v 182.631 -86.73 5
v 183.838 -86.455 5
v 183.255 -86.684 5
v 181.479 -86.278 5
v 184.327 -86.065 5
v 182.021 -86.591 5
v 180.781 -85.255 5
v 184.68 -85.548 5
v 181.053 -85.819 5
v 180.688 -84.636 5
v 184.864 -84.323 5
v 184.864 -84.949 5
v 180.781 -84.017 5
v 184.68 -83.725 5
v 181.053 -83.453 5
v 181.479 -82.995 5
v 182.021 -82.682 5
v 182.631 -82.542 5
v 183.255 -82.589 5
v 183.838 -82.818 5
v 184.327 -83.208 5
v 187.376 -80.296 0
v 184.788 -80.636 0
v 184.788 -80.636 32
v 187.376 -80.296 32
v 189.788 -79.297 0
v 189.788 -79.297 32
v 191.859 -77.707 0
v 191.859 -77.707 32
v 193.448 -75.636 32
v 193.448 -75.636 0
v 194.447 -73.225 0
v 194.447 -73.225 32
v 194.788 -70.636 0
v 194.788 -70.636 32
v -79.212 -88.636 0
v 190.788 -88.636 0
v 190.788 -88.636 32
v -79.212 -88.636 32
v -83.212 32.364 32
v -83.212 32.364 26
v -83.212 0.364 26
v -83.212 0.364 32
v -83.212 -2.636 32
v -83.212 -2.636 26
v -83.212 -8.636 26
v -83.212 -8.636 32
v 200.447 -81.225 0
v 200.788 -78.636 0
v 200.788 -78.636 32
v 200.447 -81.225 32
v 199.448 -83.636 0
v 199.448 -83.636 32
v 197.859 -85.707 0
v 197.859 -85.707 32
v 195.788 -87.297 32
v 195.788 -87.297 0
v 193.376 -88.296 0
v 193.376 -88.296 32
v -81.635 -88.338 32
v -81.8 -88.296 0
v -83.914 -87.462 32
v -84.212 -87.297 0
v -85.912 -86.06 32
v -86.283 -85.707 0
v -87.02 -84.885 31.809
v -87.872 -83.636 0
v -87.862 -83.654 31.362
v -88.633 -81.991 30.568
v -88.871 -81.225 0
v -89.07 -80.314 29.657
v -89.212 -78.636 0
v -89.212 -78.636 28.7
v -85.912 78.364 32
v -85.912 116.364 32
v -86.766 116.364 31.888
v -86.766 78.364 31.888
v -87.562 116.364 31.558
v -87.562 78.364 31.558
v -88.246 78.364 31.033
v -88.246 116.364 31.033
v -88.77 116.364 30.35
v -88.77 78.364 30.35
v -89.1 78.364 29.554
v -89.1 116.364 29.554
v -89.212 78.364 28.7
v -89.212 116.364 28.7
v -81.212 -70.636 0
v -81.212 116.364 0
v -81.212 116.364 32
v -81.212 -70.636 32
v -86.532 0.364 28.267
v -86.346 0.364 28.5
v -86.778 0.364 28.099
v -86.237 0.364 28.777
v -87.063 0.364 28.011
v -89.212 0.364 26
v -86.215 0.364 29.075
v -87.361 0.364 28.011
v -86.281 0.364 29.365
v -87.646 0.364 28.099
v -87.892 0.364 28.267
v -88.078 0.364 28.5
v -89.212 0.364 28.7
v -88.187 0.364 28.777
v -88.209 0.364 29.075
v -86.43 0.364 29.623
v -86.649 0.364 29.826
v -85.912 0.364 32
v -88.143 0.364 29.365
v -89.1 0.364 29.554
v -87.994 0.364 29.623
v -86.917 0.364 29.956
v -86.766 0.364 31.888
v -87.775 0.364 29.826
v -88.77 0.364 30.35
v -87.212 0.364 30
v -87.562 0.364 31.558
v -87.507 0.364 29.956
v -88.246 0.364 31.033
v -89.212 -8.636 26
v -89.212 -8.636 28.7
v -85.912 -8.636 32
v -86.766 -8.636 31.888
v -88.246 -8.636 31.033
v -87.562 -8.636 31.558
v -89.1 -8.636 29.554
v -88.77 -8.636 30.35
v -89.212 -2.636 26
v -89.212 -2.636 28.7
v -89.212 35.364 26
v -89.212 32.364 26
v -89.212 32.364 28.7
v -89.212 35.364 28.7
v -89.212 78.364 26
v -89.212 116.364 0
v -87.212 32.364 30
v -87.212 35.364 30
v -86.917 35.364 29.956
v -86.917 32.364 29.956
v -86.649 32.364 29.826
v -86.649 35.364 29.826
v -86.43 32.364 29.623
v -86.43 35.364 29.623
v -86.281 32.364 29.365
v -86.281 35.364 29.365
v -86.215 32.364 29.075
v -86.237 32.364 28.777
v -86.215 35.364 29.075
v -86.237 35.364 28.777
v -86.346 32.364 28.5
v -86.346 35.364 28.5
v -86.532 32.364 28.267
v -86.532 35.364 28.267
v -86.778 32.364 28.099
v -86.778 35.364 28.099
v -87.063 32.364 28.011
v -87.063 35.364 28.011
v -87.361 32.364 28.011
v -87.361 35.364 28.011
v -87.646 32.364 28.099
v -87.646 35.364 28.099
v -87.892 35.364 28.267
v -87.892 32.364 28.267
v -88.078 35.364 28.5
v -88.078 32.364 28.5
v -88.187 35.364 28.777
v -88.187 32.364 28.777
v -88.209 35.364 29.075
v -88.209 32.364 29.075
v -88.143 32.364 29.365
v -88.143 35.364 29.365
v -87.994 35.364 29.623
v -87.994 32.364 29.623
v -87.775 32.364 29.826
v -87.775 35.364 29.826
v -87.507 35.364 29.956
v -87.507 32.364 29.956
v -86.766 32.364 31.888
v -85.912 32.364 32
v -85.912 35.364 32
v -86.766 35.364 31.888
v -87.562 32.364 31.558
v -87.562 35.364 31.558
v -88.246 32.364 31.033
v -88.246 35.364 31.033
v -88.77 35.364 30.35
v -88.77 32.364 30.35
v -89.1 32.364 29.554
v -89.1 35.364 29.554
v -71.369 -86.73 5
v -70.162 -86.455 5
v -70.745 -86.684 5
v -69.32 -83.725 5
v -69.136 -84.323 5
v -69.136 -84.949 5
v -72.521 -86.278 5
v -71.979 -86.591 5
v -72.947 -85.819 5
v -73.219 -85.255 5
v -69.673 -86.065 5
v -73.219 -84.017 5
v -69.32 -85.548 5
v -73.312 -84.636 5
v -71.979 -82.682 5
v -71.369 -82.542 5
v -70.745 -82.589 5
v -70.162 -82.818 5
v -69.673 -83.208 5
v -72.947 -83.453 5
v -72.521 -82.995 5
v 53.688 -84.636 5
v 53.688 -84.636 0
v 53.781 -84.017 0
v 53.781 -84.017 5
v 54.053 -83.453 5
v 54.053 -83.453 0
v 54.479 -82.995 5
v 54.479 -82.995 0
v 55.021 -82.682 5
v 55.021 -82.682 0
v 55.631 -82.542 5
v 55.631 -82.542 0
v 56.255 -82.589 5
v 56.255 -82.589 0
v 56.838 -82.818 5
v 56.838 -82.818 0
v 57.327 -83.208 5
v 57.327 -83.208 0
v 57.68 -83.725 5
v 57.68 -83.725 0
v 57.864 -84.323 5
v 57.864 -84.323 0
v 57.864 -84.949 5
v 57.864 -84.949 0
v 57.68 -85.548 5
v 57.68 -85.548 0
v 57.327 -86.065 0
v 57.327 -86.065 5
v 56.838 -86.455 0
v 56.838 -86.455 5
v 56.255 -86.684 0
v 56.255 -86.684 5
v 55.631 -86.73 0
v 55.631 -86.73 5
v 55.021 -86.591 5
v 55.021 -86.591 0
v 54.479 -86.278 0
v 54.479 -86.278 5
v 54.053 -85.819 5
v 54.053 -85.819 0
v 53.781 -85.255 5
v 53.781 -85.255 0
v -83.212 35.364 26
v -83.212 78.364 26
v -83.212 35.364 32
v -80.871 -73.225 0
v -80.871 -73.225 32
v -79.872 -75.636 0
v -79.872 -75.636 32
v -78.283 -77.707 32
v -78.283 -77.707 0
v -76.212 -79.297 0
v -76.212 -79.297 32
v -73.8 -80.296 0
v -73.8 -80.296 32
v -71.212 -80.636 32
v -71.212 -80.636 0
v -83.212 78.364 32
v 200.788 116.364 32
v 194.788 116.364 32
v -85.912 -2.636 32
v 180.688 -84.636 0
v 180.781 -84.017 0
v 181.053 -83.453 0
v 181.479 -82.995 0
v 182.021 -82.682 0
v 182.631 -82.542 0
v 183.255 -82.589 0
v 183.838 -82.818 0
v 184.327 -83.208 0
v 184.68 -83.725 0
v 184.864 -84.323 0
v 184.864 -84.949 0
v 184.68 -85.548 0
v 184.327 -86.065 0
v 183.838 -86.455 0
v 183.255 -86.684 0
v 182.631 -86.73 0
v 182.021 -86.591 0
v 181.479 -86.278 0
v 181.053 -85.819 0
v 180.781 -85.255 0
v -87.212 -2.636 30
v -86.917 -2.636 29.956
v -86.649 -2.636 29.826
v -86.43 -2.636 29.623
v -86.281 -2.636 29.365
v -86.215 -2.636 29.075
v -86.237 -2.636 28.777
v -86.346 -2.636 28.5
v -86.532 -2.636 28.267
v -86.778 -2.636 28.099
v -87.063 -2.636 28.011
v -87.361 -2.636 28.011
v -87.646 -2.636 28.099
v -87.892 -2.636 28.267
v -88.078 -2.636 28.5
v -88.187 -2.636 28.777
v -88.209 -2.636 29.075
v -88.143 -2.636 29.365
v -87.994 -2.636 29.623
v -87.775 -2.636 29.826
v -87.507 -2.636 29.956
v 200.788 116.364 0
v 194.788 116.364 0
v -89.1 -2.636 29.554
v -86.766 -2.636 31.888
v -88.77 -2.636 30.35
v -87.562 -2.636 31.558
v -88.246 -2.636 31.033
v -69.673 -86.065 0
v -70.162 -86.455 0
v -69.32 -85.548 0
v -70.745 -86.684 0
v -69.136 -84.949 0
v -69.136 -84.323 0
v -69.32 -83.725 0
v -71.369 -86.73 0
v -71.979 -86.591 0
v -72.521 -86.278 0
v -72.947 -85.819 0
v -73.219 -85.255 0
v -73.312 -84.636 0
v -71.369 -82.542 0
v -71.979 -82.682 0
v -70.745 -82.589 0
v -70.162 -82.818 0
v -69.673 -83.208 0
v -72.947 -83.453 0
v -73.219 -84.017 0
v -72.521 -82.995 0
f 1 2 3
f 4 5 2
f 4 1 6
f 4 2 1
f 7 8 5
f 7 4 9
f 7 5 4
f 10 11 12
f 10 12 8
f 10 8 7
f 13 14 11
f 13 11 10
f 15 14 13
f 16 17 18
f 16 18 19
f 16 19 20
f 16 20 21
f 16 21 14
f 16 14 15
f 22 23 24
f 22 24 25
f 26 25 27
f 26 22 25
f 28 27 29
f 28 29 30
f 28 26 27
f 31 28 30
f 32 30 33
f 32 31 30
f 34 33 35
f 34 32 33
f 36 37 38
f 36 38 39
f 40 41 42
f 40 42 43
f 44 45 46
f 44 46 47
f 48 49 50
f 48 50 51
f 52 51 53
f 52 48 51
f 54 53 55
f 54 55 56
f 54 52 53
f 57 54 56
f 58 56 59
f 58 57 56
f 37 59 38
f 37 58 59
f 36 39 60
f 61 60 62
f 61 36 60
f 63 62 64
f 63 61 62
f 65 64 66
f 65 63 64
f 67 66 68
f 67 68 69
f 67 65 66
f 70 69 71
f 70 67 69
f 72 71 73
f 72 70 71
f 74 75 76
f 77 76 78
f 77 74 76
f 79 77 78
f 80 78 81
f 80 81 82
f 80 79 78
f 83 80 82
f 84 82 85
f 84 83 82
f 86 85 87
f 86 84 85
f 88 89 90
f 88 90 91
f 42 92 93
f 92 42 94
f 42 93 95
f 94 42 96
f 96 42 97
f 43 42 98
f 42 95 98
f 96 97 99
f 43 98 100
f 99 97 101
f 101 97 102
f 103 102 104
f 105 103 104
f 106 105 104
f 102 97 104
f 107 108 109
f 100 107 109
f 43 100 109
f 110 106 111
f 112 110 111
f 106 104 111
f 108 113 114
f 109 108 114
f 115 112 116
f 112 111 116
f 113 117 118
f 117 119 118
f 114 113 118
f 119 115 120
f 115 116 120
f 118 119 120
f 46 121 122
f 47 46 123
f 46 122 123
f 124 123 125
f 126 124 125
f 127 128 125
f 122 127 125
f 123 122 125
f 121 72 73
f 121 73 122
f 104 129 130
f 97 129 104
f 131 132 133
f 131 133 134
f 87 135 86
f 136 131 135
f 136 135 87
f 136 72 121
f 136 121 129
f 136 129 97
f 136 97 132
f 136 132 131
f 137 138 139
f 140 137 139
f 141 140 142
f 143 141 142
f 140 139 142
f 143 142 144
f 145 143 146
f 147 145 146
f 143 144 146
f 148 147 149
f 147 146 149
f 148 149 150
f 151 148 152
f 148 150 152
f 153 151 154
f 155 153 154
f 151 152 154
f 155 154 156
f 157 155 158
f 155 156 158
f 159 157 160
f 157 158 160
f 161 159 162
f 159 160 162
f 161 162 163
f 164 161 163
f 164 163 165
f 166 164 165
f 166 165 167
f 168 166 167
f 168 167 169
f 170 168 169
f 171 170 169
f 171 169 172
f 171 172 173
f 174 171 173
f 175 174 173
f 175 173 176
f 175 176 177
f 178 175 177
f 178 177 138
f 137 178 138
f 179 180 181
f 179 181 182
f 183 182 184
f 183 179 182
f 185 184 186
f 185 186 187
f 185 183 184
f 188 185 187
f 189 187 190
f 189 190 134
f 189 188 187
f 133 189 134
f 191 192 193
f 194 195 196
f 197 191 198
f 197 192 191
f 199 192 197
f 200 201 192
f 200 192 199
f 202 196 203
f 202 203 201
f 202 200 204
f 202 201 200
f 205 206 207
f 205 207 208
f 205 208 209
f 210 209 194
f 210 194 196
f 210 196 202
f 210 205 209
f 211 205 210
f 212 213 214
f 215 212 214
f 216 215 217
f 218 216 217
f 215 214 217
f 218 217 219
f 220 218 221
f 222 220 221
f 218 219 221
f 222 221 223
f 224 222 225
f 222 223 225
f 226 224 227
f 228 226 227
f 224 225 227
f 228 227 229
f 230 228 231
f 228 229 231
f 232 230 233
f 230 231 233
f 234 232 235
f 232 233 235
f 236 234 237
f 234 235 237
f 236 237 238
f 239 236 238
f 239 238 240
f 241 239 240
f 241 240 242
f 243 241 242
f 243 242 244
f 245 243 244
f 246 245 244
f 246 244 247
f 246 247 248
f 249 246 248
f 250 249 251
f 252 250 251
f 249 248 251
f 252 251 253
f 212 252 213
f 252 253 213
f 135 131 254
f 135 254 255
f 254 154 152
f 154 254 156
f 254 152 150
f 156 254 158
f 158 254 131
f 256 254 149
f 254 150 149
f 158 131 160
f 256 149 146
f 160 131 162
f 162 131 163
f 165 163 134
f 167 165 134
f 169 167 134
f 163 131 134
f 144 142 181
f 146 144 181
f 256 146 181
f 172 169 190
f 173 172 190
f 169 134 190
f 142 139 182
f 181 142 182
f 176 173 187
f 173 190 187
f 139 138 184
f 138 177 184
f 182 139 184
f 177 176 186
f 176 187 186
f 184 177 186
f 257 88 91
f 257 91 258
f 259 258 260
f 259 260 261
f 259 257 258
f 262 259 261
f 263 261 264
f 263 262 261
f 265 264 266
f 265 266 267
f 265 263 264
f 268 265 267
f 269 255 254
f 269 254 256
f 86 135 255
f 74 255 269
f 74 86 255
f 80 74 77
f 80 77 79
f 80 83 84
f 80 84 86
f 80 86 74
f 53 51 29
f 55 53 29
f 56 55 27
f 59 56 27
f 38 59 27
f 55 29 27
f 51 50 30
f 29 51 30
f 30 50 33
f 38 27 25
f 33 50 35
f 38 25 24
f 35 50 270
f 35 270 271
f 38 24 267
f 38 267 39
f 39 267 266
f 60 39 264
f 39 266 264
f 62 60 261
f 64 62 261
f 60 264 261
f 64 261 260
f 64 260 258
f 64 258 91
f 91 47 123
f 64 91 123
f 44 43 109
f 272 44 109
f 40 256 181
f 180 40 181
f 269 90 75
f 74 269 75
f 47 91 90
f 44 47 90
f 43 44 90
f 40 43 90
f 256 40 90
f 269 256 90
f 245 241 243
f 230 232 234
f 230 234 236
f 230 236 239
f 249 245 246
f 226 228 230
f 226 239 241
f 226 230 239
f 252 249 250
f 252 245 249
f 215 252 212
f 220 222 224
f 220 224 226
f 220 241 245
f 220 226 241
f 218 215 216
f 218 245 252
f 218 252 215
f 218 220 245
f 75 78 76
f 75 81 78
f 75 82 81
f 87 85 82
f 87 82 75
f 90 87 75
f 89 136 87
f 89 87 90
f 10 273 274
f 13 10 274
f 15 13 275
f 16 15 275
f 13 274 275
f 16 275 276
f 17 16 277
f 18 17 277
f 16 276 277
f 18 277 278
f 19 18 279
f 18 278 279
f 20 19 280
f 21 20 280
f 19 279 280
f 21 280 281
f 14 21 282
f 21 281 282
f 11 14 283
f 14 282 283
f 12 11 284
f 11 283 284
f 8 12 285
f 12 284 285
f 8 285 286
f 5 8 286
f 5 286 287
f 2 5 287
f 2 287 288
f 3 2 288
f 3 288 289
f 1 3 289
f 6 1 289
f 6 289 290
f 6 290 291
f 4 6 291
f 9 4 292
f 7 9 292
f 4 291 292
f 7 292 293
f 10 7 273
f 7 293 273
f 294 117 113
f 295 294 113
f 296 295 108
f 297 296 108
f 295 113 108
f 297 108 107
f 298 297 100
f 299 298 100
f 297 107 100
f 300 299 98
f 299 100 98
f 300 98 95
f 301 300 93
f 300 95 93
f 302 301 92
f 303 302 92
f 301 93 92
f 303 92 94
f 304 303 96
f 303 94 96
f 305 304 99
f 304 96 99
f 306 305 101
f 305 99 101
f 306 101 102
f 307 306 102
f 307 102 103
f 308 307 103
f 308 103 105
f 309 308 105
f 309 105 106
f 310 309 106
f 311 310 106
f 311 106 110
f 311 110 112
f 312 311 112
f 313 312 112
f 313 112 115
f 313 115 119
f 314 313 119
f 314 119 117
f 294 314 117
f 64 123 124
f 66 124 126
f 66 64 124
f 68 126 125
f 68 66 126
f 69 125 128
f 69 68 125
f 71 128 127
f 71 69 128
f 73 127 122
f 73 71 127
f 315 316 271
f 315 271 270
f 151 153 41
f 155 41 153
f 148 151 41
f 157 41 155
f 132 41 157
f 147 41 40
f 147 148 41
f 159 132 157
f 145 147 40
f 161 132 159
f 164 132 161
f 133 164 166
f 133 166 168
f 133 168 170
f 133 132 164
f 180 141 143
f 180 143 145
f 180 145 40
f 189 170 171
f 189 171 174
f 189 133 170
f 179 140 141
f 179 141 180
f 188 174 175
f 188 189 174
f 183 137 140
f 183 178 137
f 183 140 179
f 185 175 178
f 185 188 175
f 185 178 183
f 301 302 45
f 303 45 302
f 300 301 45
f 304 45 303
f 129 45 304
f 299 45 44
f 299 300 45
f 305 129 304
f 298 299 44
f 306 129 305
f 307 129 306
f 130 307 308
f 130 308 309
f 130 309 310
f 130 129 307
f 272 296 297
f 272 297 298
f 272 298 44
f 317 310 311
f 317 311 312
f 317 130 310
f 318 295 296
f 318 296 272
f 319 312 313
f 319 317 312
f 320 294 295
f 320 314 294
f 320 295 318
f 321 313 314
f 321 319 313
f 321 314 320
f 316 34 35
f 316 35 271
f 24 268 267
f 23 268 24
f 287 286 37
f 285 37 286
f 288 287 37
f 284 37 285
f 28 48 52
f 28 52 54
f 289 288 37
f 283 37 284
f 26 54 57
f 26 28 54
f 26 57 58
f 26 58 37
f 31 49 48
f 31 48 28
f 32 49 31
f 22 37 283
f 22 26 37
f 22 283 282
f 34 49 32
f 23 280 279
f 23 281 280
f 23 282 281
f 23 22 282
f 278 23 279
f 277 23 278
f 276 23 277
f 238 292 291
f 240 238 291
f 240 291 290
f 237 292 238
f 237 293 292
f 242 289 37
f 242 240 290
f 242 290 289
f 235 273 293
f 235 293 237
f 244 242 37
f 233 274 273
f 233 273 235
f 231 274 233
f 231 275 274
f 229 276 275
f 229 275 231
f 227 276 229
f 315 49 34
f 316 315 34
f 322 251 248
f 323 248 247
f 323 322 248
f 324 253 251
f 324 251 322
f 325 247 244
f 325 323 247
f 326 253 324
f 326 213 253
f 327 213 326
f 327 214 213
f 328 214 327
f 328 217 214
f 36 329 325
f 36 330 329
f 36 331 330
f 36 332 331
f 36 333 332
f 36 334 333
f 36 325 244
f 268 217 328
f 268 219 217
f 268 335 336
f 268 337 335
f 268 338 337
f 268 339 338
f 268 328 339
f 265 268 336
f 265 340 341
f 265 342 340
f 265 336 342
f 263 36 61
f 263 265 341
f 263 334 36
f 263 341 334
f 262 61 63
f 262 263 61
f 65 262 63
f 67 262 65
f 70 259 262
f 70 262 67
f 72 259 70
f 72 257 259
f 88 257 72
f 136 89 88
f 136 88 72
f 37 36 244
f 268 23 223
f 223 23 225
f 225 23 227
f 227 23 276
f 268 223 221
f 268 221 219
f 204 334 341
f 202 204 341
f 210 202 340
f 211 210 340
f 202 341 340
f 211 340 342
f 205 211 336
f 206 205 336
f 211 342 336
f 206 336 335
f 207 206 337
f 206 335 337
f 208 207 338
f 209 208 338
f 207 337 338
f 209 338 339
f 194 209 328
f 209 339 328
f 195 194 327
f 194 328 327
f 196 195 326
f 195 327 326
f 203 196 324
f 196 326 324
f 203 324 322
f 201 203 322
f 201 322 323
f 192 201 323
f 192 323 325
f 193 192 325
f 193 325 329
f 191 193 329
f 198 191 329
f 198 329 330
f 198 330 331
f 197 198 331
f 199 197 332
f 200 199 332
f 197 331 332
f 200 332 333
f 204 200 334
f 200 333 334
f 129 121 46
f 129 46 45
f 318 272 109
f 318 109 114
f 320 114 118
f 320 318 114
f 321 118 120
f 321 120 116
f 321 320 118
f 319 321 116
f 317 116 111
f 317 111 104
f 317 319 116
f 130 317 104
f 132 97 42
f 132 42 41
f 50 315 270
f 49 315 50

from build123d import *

# Parameters (mm, degrees)
EXTRUDE_1_DEPTH     = 32
SKETCH_2_R          = 2.1
CUT_EXTRUDE_1_DEPTH = 5
SKETCH_3_W          = 6
SKETCH_3_H          = 6
SKETCH_3_H_2        = 32
SKETCH_3_H_3        = 43
CUT_EXTRUDE_2_DEPTH = 6
SKETCH_4_R          = 1
CUT_EXTRUDE_3_DEPTH = 38
CUT_EXTRUDE_4_DEPTH = 289.729583292


with BuildPart() as part:
    # 草图1 → 凸台-拉伸1 (new body)
    with BuildSketch(Plane.XY):
        with BuildLine():
            Line((194.787878788, 116.363636364), (200.787878788, 116.363636364))
            Line((200.787878788, 116.363636364), (200.787878788, -78.636363636))
            ThreePointArc((200.787878788, -78.636363636), (197.8589466, -85.707431448), (190.787878788, -88.636363636))
            Line((190.787878788, -88.636363636), (-79.212121212, -88.636363636))
            ThreePointArc((-79.212121212, -88.636363636), (-86.283189024, -85.707431448), (-89.212121212, -78.636363636))
            Line((-89.212121212, -78.636363636), (-89.212121212, 116.363636364))
            Line((-89.212121212, 116.363636364), (-81.212121212, 116.363636364))
            Line((-81.212121212, 116.363636364), (-81.212121212, -70.636363636))
            ThreePointArc((-81.212121212, -70.636363636), (-78.283189024, -77.707431448), (-71.212121212, -80.636363636))
            Line((-71.212121212, -80.636363636), (184.787878788, -80.636363636))
            ThreePointArc((184.787878788, -80.636363636), (191.8589466, -77.707431448), (194.787878788, -70.636363636))
            Line((194.787878788, -70.636363636), (194.787878788, 116.363636364))
        make_face()
    extrude(amount=EXTRUDE_1_DEPTH)

    # 草图2 → 切除-拉伸1 (cut)
    with BuildSketch(Plane(origin=(0, 0, 0), x_dir=(-1, 0, 0), z_dir=(0, 0, -1))):
        with Locations((-182.787878788, -84.636363636)):
            Circle(SKETCH_2_R)
        with Locations((-55.787878788, -84.636363636)):
            Circle(SKETCH_2_R)
        with Locations((71.212121212, -84.636363636)):
            Circle(SKETCH_2_R)
    extrude(amount=-CUT_EXTRUDE_1_DEPTH, mode=Mode.SUBTRACT)

    # 草图3 → 切除-拉伸2 (cut)
    with BuildSketch(Plane.ZY.offset(89.212121212)):
        with Locations((29, -5.636363636)):
            Rectangle(SKETCH_3_W, SKETCH_3_H)
        with Locations((29, 16.363636364)):
            Rectangle(SKETCH_3_W, SKETCH_3_H_2)
        with Locations((29, 56.863636364)):
            Rectangle(SKETCH_3_W, SKETCH_3_H_3)
    extrude(amount=-CUT_EXTRUDE_2_DEPTH, mode=Mode.SUBTRACT)

    # 草图4 → 切除-拉伸3 (cut)
    with BuildSketch(Plane(origin=(0, 35.363636364, 0), x_dir=(1, 0, 0), z_dir=(0, 1, 0))):
        with Locations(Location((-87.212121212, -29, 0), (0, 0, 270))):
            Circle(SKETCH_4_R)
    extrude(amount=-CUT_EXTRUDE_3_DEPTH, mode=Mode.SUBTRACT)

    # 草图6 → 切除-拉伸4 (cut, through all)
    with BuildSketch(Plane.XZ.offset(88.636363636)):
        with BuildLine():
            Line((-89.212121212, 32), (-85.912121212, 32))
            ThreePointArc((-85.912121212, 32), (-88.24557359, 31.033452378), (-89.212121212, 28.7))
            Line((-89.212121212, 28.7), (-89.212121212, 32))
        make_face()
    extrude(amount=-CUT_EXTRUDE_4_DEPTH, mode=Mode.SUBTRACT)


solid = part.part
